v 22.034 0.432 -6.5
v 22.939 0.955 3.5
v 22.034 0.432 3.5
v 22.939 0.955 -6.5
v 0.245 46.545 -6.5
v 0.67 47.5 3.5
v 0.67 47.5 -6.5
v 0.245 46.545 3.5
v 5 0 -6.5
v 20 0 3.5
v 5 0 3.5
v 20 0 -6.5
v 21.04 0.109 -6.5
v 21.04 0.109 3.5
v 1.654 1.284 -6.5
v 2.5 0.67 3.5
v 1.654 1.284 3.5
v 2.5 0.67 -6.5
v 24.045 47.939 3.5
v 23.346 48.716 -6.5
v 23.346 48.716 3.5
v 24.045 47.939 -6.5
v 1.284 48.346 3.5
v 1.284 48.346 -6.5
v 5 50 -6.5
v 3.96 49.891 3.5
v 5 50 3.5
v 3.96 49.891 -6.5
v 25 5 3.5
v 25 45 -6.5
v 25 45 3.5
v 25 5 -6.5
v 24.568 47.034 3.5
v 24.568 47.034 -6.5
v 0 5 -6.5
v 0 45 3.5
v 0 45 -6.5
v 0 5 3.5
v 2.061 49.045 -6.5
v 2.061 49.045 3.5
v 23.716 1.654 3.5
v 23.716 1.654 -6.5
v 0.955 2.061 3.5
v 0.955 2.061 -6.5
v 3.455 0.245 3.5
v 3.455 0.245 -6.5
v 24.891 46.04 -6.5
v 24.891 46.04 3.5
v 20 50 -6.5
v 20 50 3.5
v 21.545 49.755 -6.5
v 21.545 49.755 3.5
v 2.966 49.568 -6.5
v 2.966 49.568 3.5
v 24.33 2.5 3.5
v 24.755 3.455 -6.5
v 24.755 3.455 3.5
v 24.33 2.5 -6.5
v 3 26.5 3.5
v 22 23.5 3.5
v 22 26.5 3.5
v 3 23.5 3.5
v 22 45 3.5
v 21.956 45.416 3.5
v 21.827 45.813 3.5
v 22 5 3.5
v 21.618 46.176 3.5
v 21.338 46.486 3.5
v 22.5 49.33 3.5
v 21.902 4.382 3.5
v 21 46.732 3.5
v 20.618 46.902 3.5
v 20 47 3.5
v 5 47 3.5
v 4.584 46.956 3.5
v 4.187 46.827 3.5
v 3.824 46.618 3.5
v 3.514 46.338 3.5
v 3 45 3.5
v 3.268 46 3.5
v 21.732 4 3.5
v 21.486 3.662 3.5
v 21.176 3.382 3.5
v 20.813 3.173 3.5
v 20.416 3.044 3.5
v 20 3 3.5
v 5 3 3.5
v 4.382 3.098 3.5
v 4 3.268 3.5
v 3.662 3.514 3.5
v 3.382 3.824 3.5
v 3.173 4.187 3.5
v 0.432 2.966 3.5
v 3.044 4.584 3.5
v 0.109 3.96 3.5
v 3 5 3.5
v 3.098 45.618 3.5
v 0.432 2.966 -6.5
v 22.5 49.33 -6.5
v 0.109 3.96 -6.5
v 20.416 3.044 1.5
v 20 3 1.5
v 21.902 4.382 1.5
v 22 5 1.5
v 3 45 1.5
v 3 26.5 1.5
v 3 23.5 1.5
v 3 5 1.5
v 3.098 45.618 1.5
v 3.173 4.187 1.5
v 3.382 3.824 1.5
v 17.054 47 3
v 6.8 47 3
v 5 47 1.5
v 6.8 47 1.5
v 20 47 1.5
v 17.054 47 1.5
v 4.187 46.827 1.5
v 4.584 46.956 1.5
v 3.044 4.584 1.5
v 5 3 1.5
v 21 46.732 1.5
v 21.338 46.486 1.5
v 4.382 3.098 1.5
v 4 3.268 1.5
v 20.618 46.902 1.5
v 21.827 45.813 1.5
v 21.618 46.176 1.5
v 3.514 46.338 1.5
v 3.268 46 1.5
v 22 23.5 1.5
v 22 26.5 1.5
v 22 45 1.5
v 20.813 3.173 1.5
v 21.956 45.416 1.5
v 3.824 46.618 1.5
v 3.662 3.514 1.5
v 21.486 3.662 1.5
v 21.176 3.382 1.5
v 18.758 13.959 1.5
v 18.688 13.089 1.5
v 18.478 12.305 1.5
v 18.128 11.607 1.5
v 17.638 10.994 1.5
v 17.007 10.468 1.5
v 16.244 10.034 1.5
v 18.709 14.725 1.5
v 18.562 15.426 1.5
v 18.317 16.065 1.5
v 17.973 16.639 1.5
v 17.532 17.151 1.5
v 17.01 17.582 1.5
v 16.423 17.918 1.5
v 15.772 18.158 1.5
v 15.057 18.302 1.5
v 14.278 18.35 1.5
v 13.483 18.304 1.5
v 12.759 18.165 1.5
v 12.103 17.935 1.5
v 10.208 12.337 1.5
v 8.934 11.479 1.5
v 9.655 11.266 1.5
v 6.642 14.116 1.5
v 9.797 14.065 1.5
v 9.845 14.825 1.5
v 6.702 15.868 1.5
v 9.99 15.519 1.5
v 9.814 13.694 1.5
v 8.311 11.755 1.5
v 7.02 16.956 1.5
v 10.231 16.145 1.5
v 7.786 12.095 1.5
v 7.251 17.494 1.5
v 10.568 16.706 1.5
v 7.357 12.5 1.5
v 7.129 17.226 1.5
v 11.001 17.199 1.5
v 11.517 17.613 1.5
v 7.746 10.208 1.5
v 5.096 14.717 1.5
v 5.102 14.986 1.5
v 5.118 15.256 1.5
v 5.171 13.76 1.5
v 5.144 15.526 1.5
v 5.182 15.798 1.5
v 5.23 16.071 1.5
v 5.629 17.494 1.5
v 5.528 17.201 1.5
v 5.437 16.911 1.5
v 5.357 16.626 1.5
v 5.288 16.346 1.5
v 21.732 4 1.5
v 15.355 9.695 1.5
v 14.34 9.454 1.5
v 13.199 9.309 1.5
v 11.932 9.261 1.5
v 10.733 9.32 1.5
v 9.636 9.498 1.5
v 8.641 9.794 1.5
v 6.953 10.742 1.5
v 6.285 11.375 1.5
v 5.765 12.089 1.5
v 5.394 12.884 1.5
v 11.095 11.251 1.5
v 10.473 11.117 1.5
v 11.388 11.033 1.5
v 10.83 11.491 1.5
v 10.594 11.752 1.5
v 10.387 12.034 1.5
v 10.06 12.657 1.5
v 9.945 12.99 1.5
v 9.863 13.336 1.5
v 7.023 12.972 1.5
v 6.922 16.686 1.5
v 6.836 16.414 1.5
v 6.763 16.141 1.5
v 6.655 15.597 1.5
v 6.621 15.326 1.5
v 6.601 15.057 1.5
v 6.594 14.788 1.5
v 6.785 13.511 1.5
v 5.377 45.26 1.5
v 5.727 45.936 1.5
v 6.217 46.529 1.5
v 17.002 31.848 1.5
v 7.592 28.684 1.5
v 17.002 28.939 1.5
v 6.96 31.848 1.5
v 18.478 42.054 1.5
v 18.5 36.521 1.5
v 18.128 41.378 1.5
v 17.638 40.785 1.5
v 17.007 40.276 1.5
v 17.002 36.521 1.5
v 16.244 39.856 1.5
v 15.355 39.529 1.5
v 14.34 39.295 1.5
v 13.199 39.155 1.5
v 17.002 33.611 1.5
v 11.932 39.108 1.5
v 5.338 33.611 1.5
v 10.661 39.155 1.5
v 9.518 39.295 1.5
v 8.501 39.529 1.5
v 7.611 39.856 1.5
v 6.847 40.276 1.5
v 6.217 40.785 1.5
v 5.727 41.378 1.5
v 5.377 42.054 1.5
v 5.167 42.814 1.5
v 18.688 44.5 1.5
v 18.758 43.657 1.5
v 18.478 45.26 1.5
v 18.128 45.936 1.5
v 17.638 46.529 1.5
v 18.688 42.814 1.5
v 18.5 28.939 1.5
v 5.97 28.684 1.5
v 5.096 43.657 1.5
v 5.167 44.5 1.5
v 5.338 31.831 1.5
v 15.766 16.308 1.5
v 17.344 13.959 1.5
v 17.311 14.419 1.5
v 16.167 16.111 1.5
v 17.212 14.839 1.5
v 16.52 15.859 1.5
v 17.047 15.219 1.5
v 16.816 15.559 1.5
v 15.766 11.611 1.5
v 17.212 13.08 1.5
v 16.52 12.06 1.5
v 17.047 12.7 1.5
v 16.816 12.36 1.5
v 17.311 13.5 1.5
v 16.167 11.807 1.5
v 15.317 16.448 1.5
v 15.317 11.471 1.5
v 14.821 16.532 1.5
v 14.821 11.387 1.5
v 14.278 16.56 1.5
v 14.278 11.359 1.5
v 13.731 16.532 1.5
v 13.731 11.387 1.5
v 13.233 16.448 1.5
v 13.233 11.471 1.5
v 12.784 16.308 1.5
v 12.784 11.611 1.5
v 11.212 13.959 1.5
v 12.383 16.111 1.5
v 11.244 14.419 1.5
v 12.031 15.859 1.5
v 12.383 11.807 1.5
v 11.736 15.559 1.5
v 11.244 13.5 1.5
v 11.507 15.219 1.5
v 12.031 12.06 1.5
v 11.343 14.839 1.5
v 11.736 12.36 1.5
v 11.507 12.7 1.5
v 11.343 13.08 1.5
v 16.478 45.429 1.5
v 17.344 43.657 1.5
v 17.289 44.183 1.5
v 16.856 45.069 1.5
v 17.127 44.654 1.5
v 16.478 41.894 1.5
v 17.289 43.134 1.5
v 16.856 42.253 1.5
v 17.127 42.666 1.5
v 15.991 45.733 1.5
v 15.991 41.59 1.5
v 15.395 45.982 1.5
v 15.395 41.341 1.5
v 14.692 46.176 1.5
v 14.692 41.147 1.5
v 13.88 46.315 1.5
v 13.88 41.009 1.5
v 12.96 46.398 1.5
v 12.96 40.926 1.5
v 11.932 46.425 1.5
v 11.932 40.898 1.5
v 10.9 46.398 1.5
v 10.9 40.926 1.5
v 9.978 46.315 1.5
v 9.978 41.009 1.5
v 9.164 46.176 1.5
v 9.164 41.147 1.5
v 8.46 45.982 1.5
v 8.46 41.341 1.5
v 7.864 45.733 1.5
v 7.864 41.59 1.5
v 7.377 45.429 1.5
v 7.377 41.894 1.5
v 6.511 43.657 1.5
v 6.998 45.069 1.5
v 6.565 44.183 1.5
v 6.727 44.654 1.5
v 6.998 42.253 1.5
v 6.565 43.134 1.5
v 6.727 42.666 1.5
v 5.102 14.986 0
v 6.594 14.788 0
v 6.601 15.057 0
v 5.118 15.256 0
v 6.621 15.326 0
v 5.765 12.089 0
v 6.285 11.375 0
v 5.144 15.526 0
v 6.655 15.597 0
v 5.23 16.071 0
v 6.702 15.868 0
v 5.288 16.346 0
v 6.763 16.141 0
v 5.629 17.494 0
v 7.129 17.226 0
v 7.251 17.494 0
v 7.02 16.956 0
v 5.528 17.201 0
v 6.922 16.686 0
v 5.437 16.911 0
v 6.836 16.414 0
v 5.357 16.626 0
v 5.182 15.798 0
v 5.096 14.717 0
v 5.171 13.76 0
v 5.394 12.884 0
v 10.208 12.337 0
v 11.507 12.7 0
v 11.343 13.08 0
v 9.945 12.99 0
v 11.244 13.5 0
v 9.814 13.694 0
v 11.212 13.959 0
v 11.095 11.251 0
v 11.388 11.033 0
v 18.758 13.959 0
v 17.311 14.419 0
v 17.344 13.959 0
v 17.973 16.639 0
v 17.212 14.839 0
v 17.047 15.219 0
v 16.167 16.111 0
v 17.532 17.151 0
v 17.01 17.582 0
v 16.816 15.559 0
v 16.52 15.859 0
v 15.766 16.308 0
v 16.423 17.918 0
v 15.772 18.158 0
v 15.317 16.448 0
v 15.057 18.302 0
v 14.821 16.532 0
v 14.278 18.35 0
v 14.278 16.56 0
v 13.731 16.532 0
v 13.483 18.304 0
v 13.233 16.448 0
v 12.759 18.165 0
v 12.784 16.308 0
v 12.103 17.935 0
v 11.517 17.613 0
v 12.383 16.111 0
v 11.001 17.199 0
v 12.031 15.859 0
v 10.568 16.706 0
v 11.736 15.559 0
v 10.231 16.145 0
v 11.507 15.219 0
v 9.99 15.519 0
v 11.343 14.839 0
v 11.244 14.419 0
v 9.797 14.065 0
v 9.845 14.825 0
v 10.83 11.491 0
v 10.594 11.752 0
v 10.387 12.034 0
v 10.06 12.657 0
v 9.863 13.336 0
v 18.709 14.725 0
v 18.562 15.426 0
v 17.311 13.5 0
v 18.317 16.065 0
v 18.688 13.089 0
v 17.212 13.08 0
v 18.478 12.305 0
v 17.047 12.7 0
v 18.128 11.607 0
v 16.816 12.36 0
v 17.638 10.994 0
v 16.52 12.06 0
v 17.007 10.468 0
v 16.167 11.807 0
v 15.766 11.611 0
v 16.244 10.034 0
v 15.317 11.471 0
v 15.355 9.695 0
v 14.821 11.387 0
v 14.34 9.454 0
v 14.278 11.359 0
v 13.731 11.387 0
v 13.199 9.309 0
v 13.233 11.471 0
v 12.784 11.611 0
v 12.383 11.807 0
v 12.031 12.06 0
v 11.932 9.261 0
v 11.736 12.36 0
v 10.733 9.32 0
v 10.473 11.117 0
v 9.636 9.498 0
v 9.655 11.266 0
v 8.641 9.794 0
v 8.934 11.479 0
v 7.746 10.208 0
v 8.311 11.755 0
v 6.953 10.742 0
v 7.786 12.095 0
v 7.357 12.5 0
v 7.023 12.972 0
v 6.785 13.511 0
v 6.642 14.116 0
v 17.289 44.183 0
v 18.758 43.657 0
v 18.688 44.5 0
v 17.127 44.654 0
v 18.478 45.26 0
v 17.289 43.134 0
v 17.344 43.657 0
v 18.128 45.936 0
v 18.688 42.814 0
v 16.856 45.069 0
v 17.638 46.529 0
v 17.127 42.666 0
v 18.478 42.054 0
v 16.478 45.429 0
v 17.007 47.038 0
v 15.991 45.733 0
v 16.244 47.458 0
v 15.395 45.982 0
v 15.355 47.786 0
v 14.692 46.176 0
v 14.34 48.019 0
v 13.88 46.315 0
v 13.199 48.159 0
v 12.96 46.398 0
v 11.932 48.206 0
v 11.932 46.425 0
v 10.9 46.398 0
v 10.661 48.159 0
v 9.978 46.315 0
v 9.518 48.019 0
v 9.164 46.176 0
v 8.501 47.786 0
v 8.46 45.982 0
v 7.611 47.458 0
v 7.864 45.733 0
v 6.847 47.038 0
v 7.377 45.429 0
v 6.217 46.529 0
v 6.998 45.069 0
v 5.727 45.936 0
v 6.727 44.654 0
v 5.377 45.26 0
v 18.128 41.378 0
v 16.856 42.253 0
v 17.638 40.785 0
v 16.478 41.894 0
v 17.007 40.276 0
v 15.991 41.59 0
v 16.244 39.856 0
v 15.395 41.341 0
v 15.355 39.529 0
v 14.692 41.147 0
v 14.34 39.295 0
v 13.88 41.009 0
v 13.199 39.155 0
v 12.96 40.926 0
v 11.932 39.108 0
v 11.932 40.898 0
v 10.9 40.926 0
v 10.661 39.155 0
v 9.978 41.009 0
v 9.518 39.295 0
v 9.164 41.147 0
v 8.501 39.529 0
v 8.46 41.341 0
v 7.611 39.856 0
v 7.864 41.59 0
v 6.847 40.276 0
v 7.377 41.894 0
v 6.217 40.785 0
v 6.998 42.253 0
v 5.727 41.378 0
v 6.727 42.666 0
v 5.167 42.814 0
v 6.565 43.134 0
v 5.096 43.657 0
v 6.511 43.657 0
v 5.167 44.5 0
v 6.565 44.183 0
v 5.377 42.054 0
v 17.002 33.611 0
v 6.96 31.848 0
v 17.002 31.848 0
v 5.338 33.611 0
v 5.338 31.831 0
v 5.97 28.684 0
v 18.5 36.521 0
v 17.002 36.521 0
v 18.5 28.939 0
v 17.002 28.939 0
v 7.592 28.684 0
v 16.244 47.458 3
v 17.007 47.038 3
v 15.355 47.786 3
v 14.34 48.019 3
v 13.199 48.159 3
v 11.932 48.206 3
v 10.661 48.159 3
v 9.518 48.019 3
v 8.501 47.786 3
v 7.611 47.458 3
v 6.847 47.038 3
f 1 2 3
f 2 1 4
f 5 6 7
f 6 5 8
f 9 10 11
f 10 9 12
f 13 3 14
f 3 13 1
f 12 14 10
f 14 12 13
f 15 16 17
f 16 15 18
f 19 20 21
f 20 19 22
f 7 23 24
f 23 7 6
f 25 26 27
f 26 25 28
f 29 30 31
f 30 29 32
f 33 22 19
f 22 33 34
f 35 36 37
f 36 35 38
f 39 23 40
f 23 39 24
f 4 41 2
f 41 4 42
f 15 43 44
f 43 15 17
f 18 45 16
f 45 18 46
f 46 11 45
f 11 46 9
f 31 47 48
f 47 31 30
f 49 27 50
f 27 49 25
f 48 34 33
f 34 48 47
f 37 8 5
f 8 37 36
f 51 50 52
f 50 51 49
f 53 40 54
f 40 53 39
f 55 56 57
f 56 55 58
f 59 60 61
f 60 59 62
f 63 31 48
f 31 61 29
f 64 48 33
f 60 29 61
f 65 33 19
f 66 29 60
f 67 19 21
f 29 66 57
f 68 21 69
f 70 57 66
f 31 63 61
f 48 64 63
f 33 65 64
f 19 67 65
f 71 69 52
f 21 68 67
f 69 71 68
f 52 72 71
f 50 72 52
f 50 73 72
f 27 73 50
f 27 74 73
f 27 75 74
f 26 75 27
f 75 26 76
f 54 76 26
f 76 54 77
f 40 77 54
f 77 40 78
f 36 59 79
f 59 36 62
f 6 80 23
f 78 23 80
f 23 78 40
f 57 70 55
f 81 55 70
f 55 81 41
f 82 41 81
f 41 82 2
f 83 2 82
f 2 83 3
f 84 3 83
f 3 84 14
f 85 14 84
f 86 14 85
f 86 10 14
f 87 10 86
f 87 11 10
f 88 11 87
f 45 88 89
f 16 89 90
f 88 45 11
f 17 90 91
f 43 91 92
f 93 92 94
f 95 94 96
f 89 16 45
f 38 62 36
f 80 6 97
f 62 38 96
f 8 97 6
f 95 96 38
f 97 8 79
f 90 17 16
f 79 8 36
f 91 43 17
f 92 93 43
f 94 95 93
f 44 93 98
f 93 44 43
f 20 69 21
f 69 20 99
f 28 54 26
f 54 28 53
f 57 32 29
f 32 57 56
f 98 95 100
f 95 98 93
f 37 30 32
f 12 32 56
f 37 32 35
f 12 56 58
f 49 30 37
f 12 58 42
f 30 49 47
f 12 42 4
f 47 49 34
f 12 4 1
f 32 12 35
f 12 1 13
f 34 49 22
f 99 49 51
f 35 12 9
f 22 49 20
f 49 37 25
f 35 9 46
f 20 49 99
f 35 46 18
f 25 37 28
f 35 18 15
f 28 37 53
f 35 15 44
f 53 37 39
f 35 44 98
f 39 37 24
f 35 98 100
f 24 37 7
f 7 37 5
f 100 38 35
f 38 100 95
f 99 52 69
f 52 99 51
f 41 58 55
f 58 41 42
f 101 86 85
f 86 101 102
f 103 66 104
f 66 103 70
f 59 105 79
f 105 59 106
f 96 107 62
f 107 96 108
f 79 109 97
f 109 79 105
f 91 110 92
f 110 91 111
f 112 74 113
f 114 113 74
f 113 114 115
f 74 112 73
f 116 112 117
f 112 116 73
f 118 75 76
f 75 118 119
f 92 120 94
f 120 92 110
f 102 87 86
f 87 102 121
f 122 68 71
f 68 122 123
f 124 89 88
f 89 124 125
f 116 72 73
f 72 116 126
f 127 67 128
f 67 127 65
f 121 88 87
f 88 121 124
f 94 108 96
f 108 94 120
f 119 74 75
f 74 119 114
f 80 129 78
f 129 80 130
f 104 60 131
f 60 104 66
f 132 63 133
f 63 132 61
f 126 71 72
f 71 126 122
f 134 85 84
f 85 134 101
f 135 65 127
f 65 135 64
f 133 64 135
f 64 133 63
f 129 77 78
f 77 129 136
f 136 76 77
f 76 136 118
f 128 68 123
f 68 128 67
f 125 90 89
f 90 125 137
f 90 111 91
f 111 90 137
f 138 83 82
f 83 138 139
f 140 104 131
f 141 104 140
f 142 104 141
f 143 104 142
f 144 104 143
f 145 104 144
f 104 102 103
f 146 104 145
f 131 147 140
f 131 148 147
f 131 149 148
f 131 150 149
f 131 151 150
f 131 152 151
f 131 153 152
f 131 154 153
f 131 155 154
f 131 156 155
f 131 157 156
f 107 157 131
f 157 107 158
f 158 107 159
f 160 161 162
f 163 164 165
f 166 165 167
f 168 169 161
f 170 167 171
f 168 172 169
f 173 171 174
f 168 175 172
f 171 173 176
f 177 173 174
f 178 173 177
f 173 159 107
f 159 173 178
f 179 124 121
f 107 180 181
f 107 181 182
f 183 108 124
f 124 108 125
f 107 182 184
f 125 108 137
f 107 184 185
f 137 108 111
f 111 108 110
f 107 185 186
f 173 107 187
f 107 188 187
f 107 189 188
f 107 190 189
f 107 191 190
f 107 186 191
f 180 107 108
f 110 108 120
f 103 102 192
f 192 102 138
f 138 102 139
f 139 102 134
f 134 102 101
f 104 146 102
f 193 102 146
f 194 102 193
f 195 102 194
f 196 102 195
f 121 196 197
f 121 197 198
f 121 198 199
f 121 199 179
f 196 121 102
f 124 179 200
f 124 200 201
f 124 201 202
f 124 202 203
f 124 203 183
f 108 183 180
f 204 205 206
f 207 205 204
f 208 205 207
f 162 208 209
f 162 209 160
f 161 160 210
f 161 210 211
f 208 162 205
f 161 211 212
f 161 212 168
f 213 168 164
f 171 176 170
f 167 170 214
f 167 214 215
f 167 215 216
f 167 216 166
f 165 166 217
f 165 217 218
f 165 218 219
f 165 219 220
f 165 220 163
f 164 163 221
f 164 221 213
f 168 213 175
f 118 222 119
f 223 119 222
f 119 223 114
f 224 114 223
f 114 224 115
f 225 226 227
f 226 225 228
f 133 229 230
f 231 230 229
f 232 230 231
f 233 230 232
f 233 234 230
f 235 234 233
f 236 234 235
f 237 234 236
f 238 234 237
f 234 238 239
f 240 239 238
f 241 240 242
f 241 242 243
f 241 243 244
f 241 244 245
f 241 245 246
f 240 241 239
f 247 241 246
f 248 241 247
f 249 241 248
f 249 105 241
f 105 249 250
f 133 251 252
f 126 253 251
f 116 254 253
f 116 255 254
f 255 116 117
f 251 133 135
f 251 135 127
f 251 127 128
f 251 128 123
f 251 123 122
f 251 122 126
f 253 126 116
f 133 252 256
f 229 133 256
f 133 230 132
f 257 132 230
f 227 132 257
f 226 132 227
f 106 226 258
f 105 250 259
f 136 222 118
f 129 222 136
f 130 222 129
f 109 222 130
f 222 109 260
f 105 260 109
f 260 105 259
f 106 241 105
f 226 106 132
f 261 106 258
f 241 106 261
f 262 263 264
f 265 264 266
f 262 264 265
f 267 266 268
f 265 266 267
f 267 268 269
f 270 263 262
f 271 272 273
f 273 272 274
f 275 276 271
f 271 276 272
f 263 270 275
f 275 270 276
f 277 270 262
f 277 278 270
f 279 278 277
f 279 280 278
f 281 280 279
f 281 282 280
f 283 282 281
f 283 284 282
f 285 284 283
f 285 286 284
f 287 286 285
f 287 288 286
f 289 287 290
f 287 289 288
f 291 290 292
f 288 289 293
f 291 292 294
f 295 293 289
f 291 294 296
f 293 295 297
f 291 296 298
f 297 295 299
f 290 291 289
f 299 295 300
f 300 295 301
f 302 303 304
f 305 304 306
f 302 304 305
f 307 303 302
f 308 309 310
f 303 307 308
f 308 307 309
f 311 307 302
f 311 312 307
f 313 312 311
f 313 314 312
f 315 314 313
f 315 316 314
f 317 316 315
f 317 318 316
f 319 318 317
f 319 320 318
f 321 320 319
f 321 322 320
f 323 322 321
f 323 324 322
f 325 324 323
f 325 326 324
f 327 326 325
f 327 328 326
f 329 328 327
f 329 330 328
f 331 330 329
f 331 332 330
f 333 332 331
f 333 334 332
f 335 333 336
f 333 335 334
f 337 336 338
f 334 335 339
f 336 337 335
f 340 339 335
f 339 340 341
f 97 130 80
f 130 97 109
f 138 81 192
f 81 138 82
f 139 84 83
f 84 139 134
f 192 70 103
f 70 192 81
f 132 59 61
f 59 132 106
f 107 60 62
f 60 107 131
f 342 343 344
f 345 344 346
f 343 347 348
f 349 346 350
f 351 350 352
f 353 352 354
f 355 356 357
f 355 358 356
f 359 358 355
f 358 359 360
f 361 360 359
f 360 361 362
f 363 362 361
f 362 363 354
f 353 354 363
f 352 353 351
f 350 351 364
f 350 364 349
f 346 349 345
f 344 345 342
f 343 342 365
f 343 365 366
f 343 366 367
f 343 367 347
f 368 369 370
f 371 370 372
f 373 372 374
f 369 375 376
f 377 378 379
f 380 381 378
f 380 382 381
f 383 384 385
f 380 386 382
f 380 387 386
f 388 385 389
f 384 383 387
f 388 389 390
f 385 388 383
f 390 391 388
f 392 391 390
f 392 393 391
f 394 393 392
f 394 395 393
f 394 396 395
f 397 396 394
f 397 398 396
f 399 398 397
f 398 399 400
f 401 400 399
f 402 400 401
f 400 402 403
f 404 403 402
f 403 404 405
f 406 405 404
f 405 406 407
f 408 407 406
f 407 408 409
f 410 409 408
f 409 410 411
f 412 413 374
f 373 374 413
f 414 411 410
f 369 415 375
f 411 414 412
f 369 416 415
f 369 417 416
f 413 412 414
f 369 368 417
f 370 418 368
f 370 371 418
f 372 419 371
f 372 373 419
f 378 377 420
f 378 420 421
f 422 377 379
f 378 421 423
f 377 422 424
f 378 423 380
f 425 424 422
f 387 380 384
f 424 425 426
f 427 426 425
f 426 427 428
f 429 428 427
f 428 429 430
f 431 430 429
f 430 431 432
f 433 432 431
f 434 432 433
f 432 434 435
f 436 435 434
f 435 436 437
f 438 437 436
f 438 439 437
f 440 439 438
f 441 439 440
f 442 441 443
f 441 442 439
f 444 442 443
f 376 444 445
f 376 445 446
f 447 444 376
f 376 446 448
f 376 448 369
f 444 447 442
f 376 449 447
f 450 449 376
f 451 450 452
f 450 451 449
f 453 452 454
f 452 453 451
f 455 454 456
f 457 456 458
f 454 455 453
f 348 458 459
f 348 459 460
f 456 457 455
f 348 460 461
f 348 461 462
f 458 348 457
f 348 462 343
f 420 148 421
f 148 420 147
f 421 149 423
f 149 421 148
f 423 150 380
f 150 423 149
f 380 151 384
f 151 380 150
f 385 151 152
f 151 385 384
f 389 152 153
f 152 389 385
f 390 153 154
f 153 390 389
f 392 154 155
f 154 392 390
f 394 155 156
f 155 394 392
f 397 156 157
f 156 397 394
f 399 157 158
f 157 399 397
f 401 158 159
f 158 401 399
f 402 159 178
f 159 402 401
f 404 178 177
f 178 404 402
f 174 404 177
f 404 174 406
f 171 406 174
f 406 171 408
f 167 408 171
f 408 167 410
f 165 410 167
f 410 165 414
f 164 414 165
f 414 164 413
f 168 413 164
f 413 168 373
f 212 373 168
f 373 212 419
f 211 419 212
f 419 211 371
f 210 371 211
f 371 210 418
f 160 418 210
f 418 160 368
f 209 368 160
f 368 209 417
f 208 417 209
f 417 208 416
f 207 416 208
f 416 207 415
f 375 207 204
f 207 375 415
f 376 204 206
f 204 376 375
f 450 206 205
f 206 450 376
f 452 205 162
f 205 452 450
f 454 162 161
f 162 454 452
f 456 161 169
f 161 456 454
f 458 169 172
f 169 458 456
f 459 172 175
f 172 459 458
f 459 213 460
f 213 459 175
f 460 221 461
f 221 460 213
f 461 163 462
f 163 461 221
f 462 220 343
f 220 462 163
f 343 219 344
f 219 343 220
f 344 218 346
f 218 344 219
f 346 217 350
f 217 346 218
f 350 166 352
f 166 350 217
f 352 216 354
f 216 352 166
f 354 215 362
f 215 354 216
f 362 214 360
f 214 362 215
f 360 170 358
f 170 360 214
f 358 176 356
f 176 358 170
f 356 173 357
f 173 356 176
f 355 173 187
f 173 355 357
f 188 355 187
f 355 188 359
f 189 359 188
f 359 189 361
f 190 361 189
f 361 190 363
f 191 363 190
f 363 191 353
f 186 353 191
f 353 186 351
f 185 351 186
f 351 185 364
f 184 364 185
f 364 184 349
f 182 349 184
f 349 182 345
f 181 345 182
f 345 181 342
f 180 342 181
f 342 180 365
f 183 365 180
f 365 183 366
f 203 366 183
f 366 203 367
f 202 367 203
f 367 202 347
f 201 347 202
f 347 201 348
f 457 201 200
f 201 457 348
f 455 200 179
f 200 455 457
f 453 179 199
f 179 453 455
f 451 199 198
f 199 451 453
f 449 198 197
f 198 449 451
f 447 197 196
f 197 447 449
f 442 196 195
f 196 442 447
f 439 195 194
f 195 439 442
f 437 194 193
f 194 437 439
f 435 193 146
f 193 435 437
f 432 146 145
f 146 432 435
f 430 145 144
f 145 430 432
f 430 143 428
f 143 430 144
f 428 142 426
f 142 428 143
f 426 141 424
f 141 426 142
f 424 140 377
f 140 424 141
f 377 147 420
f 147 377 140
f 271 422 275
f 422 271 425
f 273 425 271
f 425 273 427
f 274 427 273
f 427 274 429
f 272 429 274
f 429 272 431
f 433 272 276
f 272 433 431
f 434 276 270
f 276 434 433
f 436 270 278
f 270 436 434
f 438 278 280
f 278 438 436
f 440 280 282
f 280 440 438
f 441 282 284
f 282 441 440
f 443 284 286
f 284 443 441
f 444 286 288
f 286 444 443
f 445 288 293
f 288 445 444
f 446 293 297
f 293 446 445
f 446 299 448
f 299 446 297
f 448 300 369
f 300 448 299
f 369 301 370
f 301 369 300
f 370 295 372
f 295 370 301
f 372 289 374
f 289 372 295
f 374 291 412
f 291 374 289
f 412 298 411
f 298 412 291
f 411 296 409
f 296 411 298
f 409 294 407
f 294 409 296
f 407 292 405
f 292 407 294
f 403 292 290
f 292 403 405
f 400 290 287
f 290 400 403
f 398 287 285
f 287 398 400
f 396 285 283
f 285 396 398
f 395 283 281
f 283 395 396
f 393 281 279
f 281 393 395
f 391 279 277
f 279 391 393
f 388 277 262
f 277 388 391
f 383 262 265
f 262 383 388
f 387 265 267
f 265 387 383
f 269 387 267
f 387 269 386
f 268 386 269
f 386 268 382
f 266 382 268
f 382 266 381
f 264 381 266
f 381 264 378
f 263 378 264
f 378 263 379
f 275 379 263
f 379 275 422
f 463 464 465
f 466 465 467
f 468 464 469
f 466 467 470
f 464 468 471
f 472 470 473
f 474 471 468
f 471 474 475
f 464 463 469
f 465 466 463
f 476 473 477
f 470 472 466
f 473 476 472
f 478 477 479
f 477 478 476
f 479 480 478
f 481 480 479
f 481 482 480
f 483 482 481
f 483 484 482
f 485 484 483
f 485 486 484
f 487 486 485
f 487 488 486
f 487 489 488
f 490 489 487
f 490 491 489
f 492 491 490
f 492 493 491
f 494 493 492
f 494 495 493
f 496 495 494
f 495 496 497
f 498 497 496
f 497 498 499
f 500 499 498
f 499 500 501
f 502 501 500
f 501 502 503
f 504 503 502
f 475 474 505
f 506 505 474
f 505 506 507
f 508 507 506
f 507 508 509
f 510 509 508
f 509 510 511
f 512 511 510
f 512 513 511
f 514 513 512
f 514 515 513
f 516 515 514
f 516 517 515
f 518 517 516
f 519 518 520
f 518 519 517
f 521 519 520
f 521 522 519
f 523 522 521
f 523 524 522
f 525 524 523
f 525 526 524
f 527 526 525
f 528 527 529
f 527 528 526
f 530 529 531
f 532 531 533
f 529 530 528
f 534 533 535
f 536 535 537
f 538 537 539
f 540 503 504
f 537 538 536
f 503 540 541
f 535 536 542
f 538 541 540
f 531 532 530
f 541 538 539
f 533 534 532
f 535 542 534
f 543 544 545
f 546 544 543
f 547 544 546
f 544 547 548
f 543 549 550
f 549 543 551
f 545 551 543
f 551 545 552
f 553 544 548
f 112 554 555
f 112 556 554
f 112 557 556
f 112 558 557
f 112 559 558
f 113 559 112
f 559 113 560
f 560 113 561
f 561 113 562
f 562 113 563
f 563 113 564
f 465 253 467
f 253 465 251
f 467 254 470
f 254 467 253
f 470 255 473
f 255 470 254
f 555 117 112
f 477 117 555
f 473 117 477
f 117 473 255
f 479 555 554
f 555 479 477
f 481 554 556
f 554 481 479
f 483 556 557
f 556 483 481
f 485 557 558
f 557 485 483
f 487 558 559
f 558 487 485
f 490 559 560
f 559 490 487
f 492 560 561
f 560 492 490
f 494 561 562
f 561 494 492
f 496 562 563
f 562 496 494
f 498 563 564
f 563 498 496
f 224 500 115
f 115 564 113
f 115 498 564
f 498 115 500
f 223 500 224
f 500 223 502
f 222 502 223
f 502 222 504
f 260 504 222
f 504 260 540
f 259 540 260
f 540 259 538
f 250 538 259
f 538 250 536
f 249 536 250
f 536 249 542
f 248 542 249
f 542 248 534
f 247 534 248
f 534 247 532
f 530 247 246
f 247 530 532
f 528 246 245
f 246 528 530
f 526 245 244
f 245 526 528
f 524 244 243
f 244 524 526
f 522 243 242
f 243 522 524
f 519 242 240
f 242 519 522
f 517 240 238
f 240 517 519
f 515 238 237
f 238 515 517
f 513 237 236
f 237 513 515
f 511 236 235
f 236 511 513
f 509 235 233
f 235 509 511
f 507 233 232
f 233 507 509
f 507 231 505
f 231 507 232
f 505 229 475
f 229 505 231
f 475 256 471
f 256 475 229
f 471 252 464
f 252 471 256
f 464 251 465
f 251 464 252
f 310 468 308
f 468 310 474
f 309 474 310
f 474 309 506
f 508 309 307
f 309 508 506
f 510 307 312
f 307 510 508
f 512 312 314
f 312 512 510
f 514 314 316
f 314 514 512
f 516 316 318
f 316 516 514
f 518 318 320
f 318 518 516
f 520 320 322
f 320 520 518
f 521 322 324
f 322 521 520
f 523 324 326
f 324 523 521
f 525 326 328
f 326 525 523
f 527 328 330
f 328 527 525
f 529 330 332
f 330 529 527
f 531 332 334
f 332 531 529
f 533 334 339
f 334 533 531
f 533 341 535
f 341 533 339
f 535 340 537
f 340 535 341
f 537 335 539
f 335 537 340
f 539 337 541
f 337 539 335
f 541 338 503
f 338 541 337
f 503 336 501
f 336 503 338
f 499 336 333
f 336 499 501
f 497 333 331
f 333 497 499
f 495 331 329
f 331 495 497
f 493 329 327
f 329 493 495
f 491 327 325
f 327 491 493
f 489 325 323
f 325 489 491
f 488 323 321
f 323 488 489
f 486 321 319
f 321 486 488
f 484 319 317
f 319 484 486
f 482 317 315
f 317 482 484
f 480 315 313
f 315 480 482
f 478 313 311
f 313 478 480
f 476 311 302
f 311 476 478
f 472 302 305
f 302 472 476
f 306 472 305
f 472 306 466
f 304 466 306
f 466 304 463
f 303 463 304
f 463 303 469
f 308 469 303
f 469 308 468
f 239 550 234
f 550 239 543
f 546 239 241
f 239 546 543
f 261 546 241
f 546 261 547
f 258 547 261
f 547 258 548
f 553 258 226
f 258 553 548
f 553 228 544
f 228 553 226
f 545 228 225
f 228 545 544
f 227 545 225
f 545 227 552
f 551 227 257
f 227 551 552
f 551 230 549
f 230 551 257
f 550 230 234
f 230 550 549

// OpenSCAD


number_for_first_domino_space = "six"; //[one, two, three, four, five, six, seven, eight, nine, ten, eleven, twelve, blank]
number_for_second_domino_space = "ten"; //[one, two, three, four, five, six, seven, eight, nine, ten, eleven, twelve, blank]

What_font = "Standard"; //[Standard, Fjalla One, Roboto, Ubuntu, Lobster, Anton, Exo Bold, Patua One]

echo(What_font);

// Hidden parameter
module stopCustomizer(){}
$fn=35;


// Declare what size to use for each number
numSize =       (What_font == "Standard") ? 13 : 
                (What_font == "Fjalla One") ? 13.5 :
                (What_font == "Roboto") ? 13 :
                (What_font == "Ubuntu") ? 13 :
                (What_font == "Lobster") ? 14 :
                (What_font == "Anton") ? 14 :
                (What_font == "Exo Bold" ? 14 : 14);
echo(numSize);

// Declare translate X to use for each number
translateX =    (What_font == "Standard") ? 18.5 : 
                (What_font == "Fjalla One") ? 20.5 :
                (What_font == "Roboto") ? 18.6 :
                (What_font == "Ubuntu") ? 18 :
                (What_font == "Lobster") ? 19.7 :
                (What_font == "Anton") ? 19.7 :
                (What_font == "Exo Bold" ? 19 : 19);

// Declare translate Y to use for each font on single digit numbers first space
singleTranslateFirstY = (What_font == "Standard") ? 8 : 
                (What_font == "Fjalla One") ? 9.5 :
                (What_font == "Roboto") ? 8 :
                (What_font == "Ubuntu") ? 8 :
                (What_font == "Lobster") ? 8 :
                (What_font == "Anton") ? 9 :
                (What_font == "Exo Bold" ? 7.7 : 10.3);

// Declare translate Y to use for each font on single digit numbers second space
singleTranslateSecondY = (What_font == "Standard") ? 31.5 : 
                (What_font == "Fjalla One") ? 32.5 :
                (What_font == "Roboto") ? 32 :
                (What_font == "Ubuntu") ? 32 :
                (What_font == "Lobster") ? 32 :
                (What_font == "Anton") ? 32 :
                (What_font == "Exo Bold" ? 31.8 : 33.4);

// Declare translate Y to use for each font on double digit numbers first space
doubleTranslateFirstY = (What_font == "Standard") ? 3 : 
                (What_font == "Fjalla One") ? 5 :
                (What_font == "Roboto") ? 3 :
                (What_font == "Ubuntu") ? 3 :
                (What_font == "Lobster") ? 4.3 :
                (What_font == "Anton") ? 4.8 :
                (What_font == "Exo Bold" ? 2 : 5);

// Declare translate Y to use for each font on double digit numbers second space
doubleTranslateSecondY = (What_font == "Standard") ? 26.7 : 
                (What_font == "Fjalla One") ? 28.5 :
                (What_font == "Roboto") ? 26 :
                (What_font == "Ubuntu") ? 26 :
                (What_font == "Lobster") ? 28 :
                (What_font == "Anton") ? 28.5 :
                (What_font == "Exo Bold" ? 25.8 : 28);

// Declare translate Y to use for first space for number 11
elevenTranslateFirstY = (What_font == "Standard") ? 3.7 : 
                (What_font == "Fjalla One") ? 5.2 :
                (What_font == "Roboto") ? 4 :
                (What_font == "Ubuntu") ? 3.8 :
                (What_font == "Lobster") ? 7 :
                (What_font == "Anton") ? 6.5 :
                (What_font == "Exo Bold" ? 3.3 : 7);

// Declare translate Y to use for second space for number 11
elevenTranslateY = (What_font == "Standard") ? 27.4 : 
                (What_font == "Fjalla One") ? 28.7 :
                (What_font == "Roboto") ? 27 :
                (What_font == "Ubuntu") ? 26.8 :
                (What_font == "Lobster") ? 30 :
                (What_font == "Anton") ? 29.5 :
                (What_font == "Exo Bold" ? 26.4 : 30.1);

/* Number Modules*/

module one()
{
    linear_extrude(height = 3)
    rotate([0,0,90])
    text("1", size = numSize, font = What_font);
}


module two()
{
    linear_extrude(height = 3)
    rotate([0,0,90])
    text("2", size = numSize, font = What_font);
}

module three()
{
    linear_extrude(height = 3)
    rotate([0,0,90])
    text("3", size = numSize, font = What_font);
}

module four()
{
    linear_extrude(height = 3)
    rotate([0,0,90])
    text("4", size = numSize, font = What_font);
}

module five()
{
    linear_extrude(height = 3)
    rotate([0,0,90])
    text("5", size = numSize, font = What_font);
}

module six()
{
    linear_extrude(height = 3)
    rotate([0,0,90])
    text("6", size = numSize, font = What_font);
}

module seven()
{
    linear_extrude(height = 3)
    rotate([0,0,90])
    text("7", size = numSize, font = What_font);
}

module eight()
{
    linear_extrude(height = 3)
    rotate([0,0,90])
    text("8", size = numSize, font = What_font);
}

module nine()
{
    linear_extrude(height = 3)
    rotate([0,0,90])
    text("9", size = numSize, font = What_font);
}

module ten()
{
    linear_extrude(height = 3)
    rotate([0,0,90])
    text("10", size = numSize, font = What_font);
}

module eleven()
{
    linear_extrude(height = 3)
    rotate([0,0,90])
    text("11", size = numSize, font = What_font);
}

module twelve()
{
    linear_extrude(height = 3)
    rotate([0,0,90])
    text("12", size = numSize, font = What_font);
}


// Main DominoBody
module dominoBody()
{
    linear_extrude(height=10)offset(r=5, $fn=30)
    square([15, 40]);
}

// Domino top cutout
module dominoCutout()
{
    linear_extrude(height=10-7.9)offset(r=5-3, $fn=30)
    square([15, 40]);
}

// Top seperator bar
module topBar()
{
    cube([25, 3, 10]);
}

// Complete Blank Domino
module blankDomino()
{
    difference()
    {
        translate([5,5,-6.5])
        dominoBody();
        translate([5,5,1.5])
        dominoCutout();
    }
    translate([0, 23.5, -6.5])
    topBar();
}


// Assignments for the first Spaces


// First domino space blank
module firstSpaceBlank()
{
        blankDomino();
}

// First domino space one

module firstSpaceOne()
{
    difference()
    {
        blankDomino();
        translate ([translateX, singleTranslateFirstY]) one();
    }
}

// First domino space two
module firstSpaceTwo()
{
    difference()
    {
        blankDomino();
        translate ([translateX, singleTranslateFirstY]) two();
    }
}

// First domino space three
module firstSpaceThree()
{
    difference()
    {
        blankDomino();
        translate ([translateX, singleTranslateFirstY]) three();
    }
}

// First domino space four
module firstSpaceFour()
{
    difference()
    {
        blankDomino();
        translate ([translateX, singleTranslateFirstY]) four();
    }
}

// First domino space five
module firstSpaceFive()
{
    difference()
    {
        blankDomino();
        translate ([translateX, singleTranslateFirstY]) five();
    }
}

// First domino space six
module firstSpaceSix()
{
    difference()
    {
        blankDomino();
        translate ([translateX, singleTranslateFirstY]) six();
    }
}

// First domino space seven
module firstSpaceSeven()
{
    difference()
    {
        blankDomino();
        translate ([translateX, singleTranslateFirstY]) seven();
    }
}

// First domino space eight
module firstSpaceEight()
{
    difference()
    {
        blankDomino();
        translate ([translateX, singleTranslateFirstY]) eight();
    }
}

// First domino space nine
module firstSpaceNine()
{
    difference()
    {
        blankDomino();
        translate ([translateX, singleTranslateFirstY]) nine();
    }
}

// First domino space ten
module firstSpaceTen()
{
    difference()
    {
        blankDomino();
        translate ([translateX, doubleTranslateFirstY]) ten();
    }
}

// First domino space eleven
module firstSpaceEleven()
{
    difference()
    {
        blankDomino();
        translate ([translateX, elevenTranslateFirstY]) eleven();
    }
}

// First domino space twelve
module firstSpaceTwelve()
{
    difference()
    {
        blankDomino();
        translate ([translateX, doubleTranslateFirstY]) twelve();
    }
}


// SPACE ONE ASSIGNMENTS

if (number_for_first_domino_space=="one")
{
    if (number_for_second_domino_space=="one")
    {
        difference()
        {
            firstSpaceOne();
            translate ([translateX, singleTranslateSecondY]) one();
        }
    }
    else
    if (number_for_second_domino_space=="two")
    {
        difference()
        {
            firstSpaceOne();
            translate ([translateX, singleTranslateSecondY]) two();
        }
    }
    else
    if (number_for_second_domino_space=="three")
    {    
        difference()
        {
            firstSpaceOne();
            translate ([translateX, singleTranslateSecondY]) three();
        }
    }
    else
    if (number_for_second_domino_space=="four")
    {
        difference()
        {
            firstSpaceOne();
            translate ([translateX, singleTranslateSecondY]) four();
        }
    }
    else        
    if (number_for_second_domino_space=="five")
    {
        difference()
        {
            firstSpaceOne();
            translate ([translateX, singleTranslateSecondY]) five();
        }
    }
    else
    if (number_for_second_domino_space=="six")
    {
        difference()
        {
            firstSpaceOne();
            translate ([translateX, singleTranslateSecondY]) six();
        }
    }
    else
    if (number_for_second_domino_space=="seven")
    {
        difference()
        {
            firstSpaceOne();
            translate ([translateX, singleTranslateSecondY]) seven();
        }
    }
    else
    if (number_for_second_domino_space=="eight")
    {
        difference()
        {
            firstSpaceOne();
            translate ([translateX, singleTranslateSecondY]) eight();
        }
    }
    else
    if (number_for_second_domino_space=="nine")
    {
        difference()
        {
            firstSpaceOne();
            translate ([translateX, singleTranslateSecondY]) nine();
        }
    }
    else
    if (number_for_second_domino_space=="ten")
    {
        difference()
        {
            firstSpaceOne();
            translate ([translateX, doubleTranslateSecondY]) ten();
        }
    }
    else
    if (number_for_second_domino_space=="eleven")
    {
        difference()
        {
            firstSpaceOne();
            translate ([translateX, elevenTranslateY]) eleven();
        }
    }
    else
    if (number_for_second_domino_space=="twelve")
    {
        difference()
        {
            firstSpaceOne();
            translate ([translateX, doubleTranslateSecondY]) twelve();
        }
    }
    else
    if (number_for_second_domino_space=="blank")
    {
        difference()
        {
            firstSpaceOne();
            translate ([translateX, doubleTranslateSecondY]) blank();
        }
    }
}
else{
if (number_for_first_domino_space=="two")
{
    if (number_for_second_domino_space=="one")
    {
        difference()
        {
            firstSpaceTwo();
            translate ([translateX, singleTranslateSecondY]) one();
        }
    }
    else
    if (number_for_second_domino_space=="two")
    {
        difference()
        {
            firstSpaceTwo();
            translate ([translateX, singleTranslateSecondY]) two();
        }
    }
    else
    if (number_for_second_domino_space=="three")
    {
        difference()
        {
            firstSpaceTwo();
            translate ([translateX, singleTranslateSecondY]) three();
        }
    }
    else
    if (number_for_second_domino_space=="four")
    {
        difference()
        {
            firstSpaceTwo();
            translate ([translateX, singleTranslateSecondY]) four();
        }
    }
    else
    if (number_for_second_domino_space=="five")
    {
        difference()
        {
            firstSpaceTwo();
            translate ([translateX, singleTranslateSecondY]) five();
        }
    }
    else
    if (number_for_second_domino_space=="six")
    {
        difference()
        {
            firstSpaceTwo();
            translate ([translateX, singleTranslateSecondY]) six();
        }
    }
    else
    if (number_for_second_domino_space=="seven")
    {
        difference()
        {
            firstSpaceTwo();
            translate ([translateX, singleTranslateSecondY]) seven();
        }
    }
    else
    if (number_for_second_domino_space=="eight")
    {
        difference()
        {
            firstSpaceTwo();
            translate ([translateX, singleTranslateSecondY]) eight();
        }
    }
    else
    if (number_for_second_domino_space=="nine")
    {
        difference()
        {
            firstSpaceTwo();
            translate ([translateX, singleTranslateSecondY]) nine();
        }
    }
    else
    if (number_for_second_domino_space=="ten")
    {
        difference()
        {
            firstSpaceTwo();
            translate ([translateX, doubleTranslateSecondY]) ten();
        }
    }
    else
    if (number_for_second_domino_space=="eleven")
    {
        difference()
        {
            firstSpaceTwo();
            translate ([translateX, elevenTranslateY]) eleven();
        }
    }
    else
    if (number_for_second_domino_space=="twelve")
    {
        difference()
        {
            firstSpaceTwo();
            translate ([translateX, doubleTranslateSecondY]) twelve();
        }
    }
    else
    if (number_for_second_domino_space=="blank")
    {
        difference()
        {
            firstSpaceTwo();
            translate ([translateX, doubleTranslateSecondY]) blank();
        }
    }
}
else{
if (number_for_first_domino_space=="three")
{
    if (number_for_second_domino_space=="one")
    {
        difference()
        {
            firstSpaceThree();
            translate ([translateX, singleTranslateSecondY]) one();
        }
    }
    else
    if (number_for_second_domino_space=="two")
    {
        difference()
        {
            firstSpaceThree();
            translate ([translateX, singleTranslateSecondY]) two();
        }
    }
    if (number_for_second_domino_space=="three")
    {
        difference()
        {
            firstSpaceThree();
            translate ([translateX, singleTranslateSecondY]) three();
        }
    }
    else
    if (number_for_second_domino_space=="four")
    {
        difference()
        {
            firstSpaceThree();
            translate ([translateX, singleTranslateSecondY]) four();
        }
    }
    else
    if (number_for_second_domino_space=="five")
    {
        difference()
        {
            firstSpaceThree();
            translate ([translateX, singleTranslateSecondY]) five();
        }
    }
    else
    if (number_for_second_domino_space=="six")
    {
        difference()
        {
            firstSpaceThree();
            translate ([translateX, singleTranslateSecondY]) six();
        }
    }
    else
    if (number_for_second_domino_space=="seven")
    {
        difference()
        {
            firstSpaceThree();
            translate ([translateX, singleTranslateSecondY]) seven();
        }
    }
    else
    if (number_for_second_domino_space=="eight")
    {
        difference()
        {
            firstSpaceThree();
            translate ([translateX, singleTranslateSecondY]) eight();
        }
    }
    else
    if (number_for_second_domino_space=="nine")
    {
        difference()
        {
            firstSpaceThree();
            translate ([translateX, singleTranslateSecondY]) nine();
        }
    }
    else
    if (number_for_second_domino_space=="ten")
    {
        difference()
        {
            firstSpaceThree();
            translate ([translateX, doubleTranslateSecondY]) ten();
        }
    }
    else
    if (number_for_second_domino_space=="eleven")
    {
        difference()
        {
            firstSpaceThree();
            translate ([translateX, elevenTranslateY]) eleven();
        }
    }
    else
    if (number_for_second_domino_space=="twelve")
    {
        difference()
        {
            firstSpaceThree();
            translate ([translateX, doubleTranslateSecondY]) twelve();
        }
    }
    else
    if (number_for_second_domino_space=="blank")
    {
        difference()
        {
            firstSpaceThree();
            translate ([translateX, doubleTranslateSecondY]) blank();
        }
    }
}
else{
if (number_for_first_domino_space=="four")
{
    if (number_for_second_domino_space=="one")
    {
        difference()
        {
            firstSpaceFour();
            translate ([translateX, singleTranslateSecondY]) one();
        }
    }
    else
    if (number_for_second_domino_space=="two")
    {
        difference()
        {
            firstSpaceFour();
            translate ([translateX, singleTranslateSecondY]) two();
        }
    }
    else
    if (number_for_second_domino_space=="three")
    {
        difference()
        {
            firstSpaceFour();
            translate ([translateX, singleTranslateSecondY]) three();
        }
    }
    else
    if (number_for_second_domino_space=="four")
    {
        difference()
        {
            firstSpaceFour();
            translate ([translateX, singleTranslateSecondY]) four();
        }
    }
    else
    if (number_for_second_domino_space=="five")
    {
        difference()
        {
            firstSpaceFour();
            translate ([translateX, singleTranslateSecondY]) five();
        }
    }
    else
    if (number_for_second_domino_space=="six")
    {
        difference()
        {
            firstSpaceFour();
            translate ([translateX, singleTranslateSecondY]) six();
        }
    }
    else
    if (number_for_second_domino_space=="seven")
    {
        difference()
        {
            firstSpaceFour();
            translate ([translateX, singleTranslateSecondY]) seven();
        }
    }
    else
    if (number_for_second_domino_space=="eight")
    {
        difference()
        {
            firstSpaceFour();
            translate ([translateX, singleTranslateSecondY]) eight();
        }
    }
    else
    if (number_for_second_domino_space=="nine")
    {
        difference()
        {
            firstSpaceFour();
            translate ([translateX, singleTranslateSecondY]) nine();
        }
    }
    else
    if (number_for_second_domino_space=="ten")
    {
        difference()
        {
            firstSpaceFour();
            translate ([translateX, doubleTranslateSecondY]) ten();
        }
    }
    else
    if (number_for_second_domino_space=="eleven")
    {
        difference()
        {
            firstSpaceFour();
            translate ([translateX, elevenTranslateY]) eleven();
        }
    }
    else
    if (number_for_second_domino_space=="twelve")
    {
        difference()
        {
            firstSpaceFour();
            translate ([translateX, doubleTranslateSecondY]) twelve();
        }
    }
    else
    if (number_for_second_domino_space=="blank")
    {
        difference()
        {
            firstSpaceFour();
            translate ([translateX, doubleTranslateSecondY]) blank();
        }
    }
}
else{
if (number_for_first_domino_space=="five")
{
    if (number_for_second_domino_space=="one")
    {
        difference()
        {
            firstSpaceFive();
            translate ([translateX, singleTranslateSecondY]) one();
        }
    }
    else
    if (number_for_second_domino_space=="two")
    {
        difference()
        {
            firstSpaceFive();
            translate ([translateX, singleTranslateSecondY]) two();
        }
    }
    else
    if (number_for_second_domino_space=="three")
    {
        difference()
        {
            firstSpaceFive();
            translate ([translateX, singleTranslateSecondY]) three();
        }
    }
    else
    if (number_for_second_domino_space=="four")
    {
        difference()
        {
            firstSpaceFive();
            translate ([translateX, singleTranslateSecondY]) four();
        }
    }
    else
    if (number_for_second_domino_space=="five")
    {
        difference()
        {
            firstSpaceFive();
            translate ([translateX, singleTranslateSecondY]) five();
        }
    }
    else
    if (number_for_second_domino_space=="six")
    {
        difference()
        {
            firstSpaceFive();
            translate ([translateX, singleTranslateSecondY]) six();
        }
    }
    else
    if (number_for_second_domino_space=="seven")
    {
        difference()
        {
            firstSpaceFive();
            translate ([translateX, singleTranslateSecondY]) seven();
        }
    }
    else
    if (number_for_second_domino_space=="eight")
    {
        difference()
        {
            firstSpaceFive();
            translate ([translateX, singleTranslateSecondY]) eight();
        }
    }
    else
    if (number_for_second_domino_space=="nine")
    {
        difference()
        {
            firstSpaceFive();
            translate ([translateX, singleTranslateSecondY]) nine();
        }
    }
    else
    if (number_for_second_domino_space=="ten")
    {
        difference()
        {
            firstSpaceFive();
            translate ([translateX, doubleTranslateSecondY]) ten();
        }
    }
    else
    if (number_for_second_domino_space=="eleven")
    {
        difference()
        {
            firstSpaceFive();
            translate ([translateX, elevenTranslateY]) eleven();
        }
    }
    else
    if (number_for_second_domino_space=="twelve")
    {
        difference()
        {
            firstSpaceFive();
            translate ([translateX, doubleTranslateSecondY]) twelve();
        }
    }
    else
    if (number_for_second_domino_space=="blank")
    {
        difference()
        {
            firstSpaceFive();
            translate ([translateX, doubleTranslateSecondY]) blank();
        }
    }
}
else{
if (number_for_first_domino_space=="six")
{
    if (number_for_second_domino_space=="one")
    {
        difference()
        {
            firstSpaceSix();
            translate ([translateX, singleTranslateSecondY]) one();
        }
    }
    else
    if (number_for_second_domino_space=="two")
    {
        difference()
        {
            firstSpaceSix();
            translate ([translateX, singleTranslateSecondY]) two();
        }
    }
    else
    if (number_for_second_domino_space=="three")
    {
        difference()
        {
            firstSpaceSix();
            translate ([translateX, singleTranslateSecondY]) three();
        }
    }
    else
    if (number_for_second_domino_space=="four")
    {
        difference()
        {
            firstSpaceSix();
            translate ([translateX, singleTranslateSecondY]) four();
        }
    }
    else
    if (number_for_second_domino_space=="five")
    {
        difference()
        {
            firstSpaceSix();
            translate ([translateX, singleTranslateSecondY]) five();
        }
    }
    else
    if (number_for_second_domino_space=="six")
    {
        difference()
        {
            firstSpaceSix();
            translate ([translateX, singleTranslateSecondY]) six();
        }
    }
    else
    if (number_for_second_domino_space=="seven")
    {
        difference()
        {
            firstSpaceSix();
            translate ([translateX, singleTranslateSecondY]) seven();
        }
    }
    else
    if (number_for_second_domino_space=="eight")
    {
        difference()
        {
            firstSpaceSix();
            translate ([translateX, singleTranslateSecondY]) eight();
        }
    }
    else
    if (number_for_second_domino_space=="nine")
    {
        difference()
        {
            firstSpaceSix();
            translate ([translateX, singleTranslateSecondY]) nine();
        }
    }
    else
    if (number_for_second_domino_space=="ten")
    {
        difference()
        {
            firstSpaceSix();
            translate ([translateX, doubleTranslateSecondY]) ten();
        }
    }
    else
    if (number_for_second_domino_space=="eleven")
    {
        difference()
        {
            firstSpaceSix();
            translate ([translateX, elevenTranslateY]) eleven();
        }
    }
    else
    if (number_for_second_domino_space=="twelve")
    {
        difference()
        {
            firstSpaceSix();
            translate ([translateX, doubleTranslateSecondY]) twelve();
        }
    }
    else
    if (number_for_second_domino_space=="blank")
    {
        difference()
        {
            firstSpaceSix();
            translate ([translateX, doubleTranslateSecondY]) blank();
        }
    }
}
else{
if (number_for_first_domino_space=="seven")
{
    if (number_for_second_domino_space=="one")
    {
        difference()
        {
            firstSpaceSeven();
            translate ([translateX, singleTranslateSecondY]) one();
        }
    }
    else
    if (number_for_second_domino_space=="two")
    {
        difference()
        {
            firstSpaceSeven();
            translate ([translateX, singleTranslateSecondY]) two();
        }
    }
    else
    if (number_for_second_domino_space=="three")
    {
        difference()
        {
            firstSpaceSeven();
            translate ([translateX, singleTranslateSecondY]) three();
        }
    }
    else
    if (number_for_second_domino_space=="four")
    {
        difference()
        {
            firstSpaceSeven();
            translate ([translateX, singleTranslateSecondY]) four();
        }
    }
    else
    if (number_for_second_domino_space=="five")
    {
        difference()
        {
            firstSpaceSeven();
            translate ([translateX, singleTranslateSecondY]) five();
        }
    }
    else
    if (number_for_second_domino_space=="six")
    {
        difference()
        {
            firstSpaceSeven();
            translate ([translateX, singleTranslateSecondY]) six();
        }
    }
    else
    if (number_for_second_domino_space=="seven")
    {
        difference()
        {
            firstSpaceSeven();
            translate ([translateX, singleTranslateSecondY]) seven();
        }
    }
    else
    if (number_for_second_domino_space=="eight")
    {
        difference()
        {
            firstSpaceSeven();
            translate ([translateX, singleTranslateSecondY]) eight();
        }
    }
    else
    if (number_for_second_domino_space=="nine")
    {
        difference()
        {
            firstSpaceSeven();
            translate ([translateX, singleTranslateSecondY]) nine();
        }
    }
    else
    if (number_for_second_domino_space=="ten")
    {
        difference()
        {
            firstSpaceSeven();
            translate ([translateX, doubleTranslateSecondY]) ten();
        }
    }
    else
    if (number_for_second_domino_space=="eleven")
    {
        difference()
        {
            firstSpaceSeven();
            translate ([translateX, elevenTranslateY]) eleven();
        }
    }
    else
    if (number_for_second_domino_space=="twelve")
    {
        difference()
        {
            firstSpaceSeven();
            translate ([translateX, doubleTranslateSecondY]) twelve();
        }
    }
    else
    if (number_for_second_domino_space=="blank")
    {
        difference()
        {
            firstSpaceSeven();
            translate ([translateX, doubleTranslateSecondY]) blank();
        }
    }
}
else{
if (number_for_first_domino_space=="eight")
{
    if (number_for_second_domino_space=="one")
    {
        difference()
        {
            firstSpaceEight();
            translate ([translateX, singleTranslateSecondY]) one();
        }
    }
    else
    if (number_for_second_domino_space=="two")
    {
        difference()
        {
            firstSpaceEight();
            translate ([translateX, singleTranslateSecondY]) two();
        }
    }
    else
    if (number_for_second_domino_space=="three")
    {
        difference()
        {
            firstSpaceEight();
            translate ([translateX, singleTranslateSecondY]) three();
        }
    }
    else
    if (number_for_second_domino_space=="four")
    {
        difference()
        {
            firstSpaceEight();
            translate ([translateX, singleTranslateSecondY]) four();
        }
    }
    else
    if (number_for_second_domino_space=="five")
    {
        difference()
        {
            firstSpaceEight();
            translate ([translateX, singleTranslateSecondY]) five();
        }
    }
    else
    if (number_for_second_domino_space=="six")
    {
        difference()
        {
            firstSpaceEight();
            translate ([translateX, singleTranslateSecondY]) six();
        }
    }
    else
    if (number_for_second_domino_space=="seven")
    {
        difference()
        {
            firstSpaceEight();
            translate ([translateX, singleTranslateSecondY]) seven();
        }
    }
    else
    if (number_for_second_domino_space=="eight")
    {
        difference()
        {
            firstSpaceEight();
            translate ([translateX, singleTranslateSecondY]) eight();
        }
    }
    else
    if (number_for_second_domino_space=="nine")
    {
        difference()
        {
            firstSpaceEight();
            translate ([translateX, singleTranslateSecondY]) nine();
        }
    }
    else
    if (number_for_second_domino_space=="ten")
    {
        difference()
        {
            firstSpaceEight();
            translate ([translateX, doubleTranslateSecondY]) ten();
        }
    }
    else
    if (number_for_second_domino_space=="eleven")
    {
        difference()
        {
            firstSpaceEight();
            translate ([translateX, elevenTranslateY]) eleven();
        }
    }
    else
    if (number_for_second_domino_space=="twelve")
    {
        difference()
        {
            firstSpaceEight();
            translate ([translateX, doubleTranslateSecondY]) twelve();
        }
    }
    else
    if (number_for_second_domino_space=="blank")
    {
        difference()
        {
            firstSpaceEight();
            translate ([translateX, doubleTranslateSecondY]) blank();
        }
    }
}
else{
if (number_for_first_domino_space=="nine")
{
    if (number_for_second_domino_space=="one")
    {
        difference()
        {
            firstSpaceNine();
            translate ([translateX, singleTranslateSecondY]) one();
        }
    }
    else
    if (number_for_second_domino_space=="two")
    {
        difference()
        {
            firstSpaceNine();
            translate ([translateX, singleTranslateSecondY]) two();
        }
    }
    else
    if (number_for_second_domino_space=="three")
    {
        difference()
        {
            firstSpaceNine();
            translate ([translateX, singleTranslateSecondY]) three();
        }
    }
    else
    if (number_for_second_domino_space=="four")
    {
        difference()
        {
            firstSpaceNine();
            translate ([translateX, singleTranslateSecondY]) four();
        }
    }
    else
    if (number_for_second_domino_space=="five")
    {
        difference()
        {
            firstSpaceNine();
            translate ([translateX, singleTranslateSecondY]) five();
        }
    }
    else
    if (number_for_second_domino_space=="six")
    {
        difference()
        {
            firstSpaceNine();
            translate ([translateX, singleTranslateSecondY]) six();
        }
    }
    else
    if (number_for_second_domino_space=="seven")
    {
        difference()
        {
            firstSpaceNine();
            translate ([translateX, singleTranslateSecondY]) seven();
        }
    }
    else
    if (number_for_second_domino_space=="eight")
    {
        difference()
        {
            firstSpaceNine();
            translate ([translateX, singleTranslateSecondY]) eight();
        }
    }
    else
    if (number_for_second_domino_space=="nine")
    {
        difference()
        {
            firstSpaceNine();
            translate ([translateX, singleTranslateSecondY]) nine();
        }
    }
    else
    if (number_for_second_domino_space=="ten")
    {
        difference()
        {
            firstSpaceNine();
            translate ([translateX, doubleTranslateSecondY]) ten();
        }
    }
    else
    if (number_for_second_domino_space=="eleven")
    {
        difference()
        {
            firstSpaceNine();
            translate ([translateX, elevenTranslateY]) eleven();
        }
    }
    else
    if (number_for_second_domino_space=="twelve")
    {
        difference()
        {
            firstSpaceNine();
            translate ([translateX, doubleTranslateSecondY]) twelve();
        }
    }
    else
    if (number_for_second_domino_space=="blank")
    {
        difference()
        {
            firstSpaceNine();
            translate ([translateX, singleTranslateSecondY]) blank();
        }
    }
}
else{
if (number_for_first_domino_space=="ten")
{
    if (number_for_second_domino_space=="one")
    {
        difference()
        {
            firstSpaceTen();
            translate ([translateX, singleTranslateSecondY]) one();
        }
    }
    else
    if (number_for_second_domino_space=="two")
    {
        difference()
        {
            firstSpaceTen();
            translate ([translateX, singleTranslateSecondY]) two();
        }
    }
    else
    if (number_for_second_domino_space=="three")
    {
        difference()
        {
            firstSpaceTen();
            translate ([translateX, singleTranslateSecondY]) three();
        }
    }
    else
    if (number_for_second_domino_space=="four")
    {
        difference()
        {
            firstSpaceTen();
            translate ([translateX, singleTranslateSecondY]) four();
        }
    }
    else
    if (number_for_second_domino_space=="five")
    {
        difference()
        {
            firstSpaceTen();
            translate ([translateX, singleTranslateSecondY]) five();
        }
    }
    else
    if (number_for_second_domino_space=="six")
    {
        difference()
        {
            firstSpaceTen();
            translate ([translateX, singleTranslateSecondY]) six();
        }
    }
    else
    if (number_for_second_domino_space=="seven")
    {
        difference()
        {
            firstSpaceTen();
            translate ([translateX, singleTranslateSecondY]) seven();
        }
    }
    else
    if (number_for_second_domino_space=="eight")
    {
        difference()
        {
            firstSpaceTen();
            translate ([translateX, singleTranslateSecondY]) eight();
        }
    }
    else
    if (number_for_second_domino_space=="nine")
    {
        difference()
        {
            firstSpaceTen();
            translate ([translateX, singleTranslateSecondY]) nine();
        }
    }
    else
    if (number_for_second_domino_space=="ten")
    {
        difference()
        {
            firstSpaceTen();
            translate ([translateX, doubleTranslateSecondY]) ten();
        }
    }
    else
    if (number_for_second_domino_space=="eleven")
    {
        difference()
        {
            firstSpaceTen();
            translate ([translateX, elevenTranslateY]) eleven();
        }
    }
    else
    if (number_for_second_domino_space=="twelve")
    {
        difference()
        {
            firstSpaceTen();
            translate ([translateX, doubleTranslateSecondY]) twelve();
        }
    }
    else
    if (number_for_second_domino_space=="blank")
    {
        difference()
        {
            firstSpaceTen();
            translate ([translateX, doubleTranslateSecondY]) blank();
        }
    }
}
else{
if (number_for_first_domino_space=="eleven")
{
    if (number_for_second_domino_space=="one")
    {
        difference()
        {
            firstSpaceEleven();
            translate ([translateX, singleTranslateSecondY]) one();
        }
    }
    else
    if (number_for_second_domino_space=="two")
    {
        difference()
        {
            firstSpaceEleven();
            translate ([translateX, singleTranslateSecondY]) two();
        }
    }
    else
    if (number_for_second_domino_space=="three")
    {
        difference()
        {
            firstSpaceEleven();
            translate ([translateX, singleTranslateSecondY]) three();
        }
    }
    else
    if (number_for_second_domino_space=="four")
    {
        difference()
        {
            firstSpaceEleven();
            translate ([translateX, singleTranslateSecondY]) four();
        }
    }
    else
    if (number_for_second_domino_space=="five")
    {
        difference()
        {
            firstSpaceEleven();
            translate ([translateX, singleTranslateSecondY]) five();
        }
    }
    else
    if (number_for_second_domino_space=="six")
    {
        difference()
        {
            firstSpaceEleven();
            translate ([translateX, singleTranslateSecondY]) six();
        }
    }
    else
    if (number_for_second_domino_space=="seven")
    {
        difference()
        {
            firstSpaceEleven();
            translate ([translateX, singleTranslateSecondY]) seven();
        }
    }
    else
    if (number_for_second_domino_space=="eight")
    {
        difference()
        {
            firstSpaceEleven();
            translate ([translateX, singleTranslateSecondY]) eight();
        }
    }
    else
    if (number_for_second_domino_space=="nine")
    {
        difference()
        {
            firstSpaceEleven();
            translate ([translateX, singleTranslateSecondY]) nine();
        }
    }
    else
    if (number_for_second_domino_space=="ten")
    {
        difference()
        {
            firstSpaceEleven();
            translate ([translateX, doubleTranslateSecondY]) ten();
        }
    }
    else
    if (number_for_second_domino_space=="eleven")
    {
        difference()
        {
            firstSpaceEleven();
            translate ([translateX, elevenTranslateY]) eleven();
        }
    }
    else
    if (number_for_second_domino_space=="twelve")
    {
        difference()
        {
            firstSpaceEleven();
            translate ([translateX, doubleTranslateSecondY]) twelve();
        }
    }
    else
    if (number_for_second_domino_space=="blank")
    {
        difference()
        {
            firstSpaceEleven();
            translate ([translateX, doubleTranslateSecondY]) blank();
        }
    }
}
else{
if (number_for_first_domino_space=="twelve")
{
    if (number_for_second_domino_space=="one")
    {
        difference()
        {
            firstSpaceTwelve();
            translate ([translateX, singleTranslateSecondY]) one();
        }
    }
    else
    if (number_for_second_domino_space=="two")
    {
        difference()
        {
            firstSpaceTwelve();
            translate ([translateX, singleTranslateSecondY]) two();
        }
    }
    else
    if (number_for_second_domino_space=="three")
    {
        difference()
        {
            firstSpaceTwelve();
            translate ([translateX, singleTranslateSecondY]) three();
        }
    }
    else
    if (number_for_second_domino_space=="four")
    {
        difference()
        {
            firstSpaceTwelve();
            translate ([translateX, singleTranslateSecondY]) four();
        }
    }
    else
    if (number_for_second_domino_space=="five")
    {
        difference()
        {
            firstSpaceTwelve();
            translate ([translateX, singleTranslateSecondY]) five();
        }
    }
    else
    if (number_for_second_domino_space=="six")
    {
        difference()
        {
            firstSpaceTwelve();
            translate ([translateX, singleTranslateSecondY]) six();
        }
    }
    else
    if (number_for_second_domino_space=="seven")
    {
        difference()
        {
            firstSpaceTwelve();
            translate ([translateX, singleTranslateSecondY]) seven();
        }
    }
    else
    if (number_for_second_domino_space=="eight")
    {
        difference()
        {
            firstSpaceTwelve();
            translate ([translateX, singleTranslateSecondY]) eight();
        }
    }
    else
    if (number_for_second_domino_space=="nine")
    {
        difference()
        {
            firstSpaceTwelve();
            translate ([translateX, singleTranslateSecondY]) nine();
        }
    }
    else
    if (number_for_second_domino_space=="ten")
    {
        difference()
        {
            firstSpaceTwelve();
            translate ([translateX, doubleTranslateSecondY]) ten();
        }
    }
    else
    if (number_for_second_domino_space=="eleven")
    {
        difference()
        {
            firstSpaceTwelve();
            translate ([translateX, elevenTranslateY]) eleven();
        }
    }
    else
    if (number_for_second_domino_space=="twelve")
    {
        difference()
        {
            firstSpaceTwelve();
            translate ([translateX, doubleTranslateSecondY]) twelve();
        }
    }
    else
    if (number_for_second_domino_space=="blank")
    {
        difference()
        {
            firstSpaceTwelve();
            translate ([translateX, doubleTranslateSecondY]) blank();
        }
    }
}
else{
if (number_for_first_domino_space=="blank")
{
    if (number_for_second_domino_space=="one")
    {
        difference()
        {
            firstSpaceBlank();
            translate ([translateX, singleTranslateSecondY]) one();
        }
    }
    else
    if (number_for_second_domino_space=="two")
    {
        difference()
        {
            firstSpaceBlank();
            translate ([translateX, singleTranslateSecondY]) two();
        }
    }
    else
    if (number_for_second_domino_space=="three")
    {
        difference()
        {
            firstSpaceBlank();
            translate ([translateX, singleTranslateSecondY]) three();
        }
    }
    else
    if (number_for_second_domino_space=="four")
    {
        difference()
        {
            firstSpaceBlank();
            translate ([translateX, singleTranslateSecondY]) four();
        }
    }
    else
    if (number_for_second_domino_space=="five")
    {
        difference()
        {
            firstSpaceBlank();
            translate ([translateX, singleTranslateSecondY]) five();
        }
    }
    else
    if (number_for_second_domino_space=="six")
    {
        difference()
        {
            firstSpaceBlank();
            translate ([translateX, singleTranslateSecondY]) six();
        }
    }
    else
    if (number_for_second_domino_space=="seven")
    {
        difference()
        {
            firstSpaceBlank();
            translate ([translateX, singleTranslateSecondY]) seven();
        }
    }
    else
    if (number_for_second_domino_space=="eight")
    {
        difference()
        {
            firstSpaceBlank();
            translate ([translateX, singleTranslateSecondY]) eight();
        }
    }
    else
    if (number_for_second_domino_space=="nine")
    {
        difference()
        {
            firstSpaceBlank();
            translate ([translateX, singleTranslateSecondY]) nine();
        }
    }
    else
    if (number_for_second_domino_space=="ten")
    {
        difference()
        {
            firstSpaceBlank();
            translate ([translateX, doubleTranslateSecondY]) ten();
        }
    }
    else
    if (number_for_second_domino_space=="eleven")
    {
        difference()
        {
            firstSpaceBlank();
            translate ([translateX, elevenTranslateY]) eleven();
        }
    }
    else
    if (number_for_second_domino_space=="twelve")
    {
        difference()
        {
            firstSpaceBlank();
            translate ([translateX, doubleTranslateSecondY]) twelve();
        }
    }
    else
    if (number_for_second_domino_space=="blank")
    {
        difference()
        {
            firstSpaceBlank();
            translate ([translateX, doubleTranslateSecondY]) blank();
        }
    }
}
}}}}}}}}}}}}













